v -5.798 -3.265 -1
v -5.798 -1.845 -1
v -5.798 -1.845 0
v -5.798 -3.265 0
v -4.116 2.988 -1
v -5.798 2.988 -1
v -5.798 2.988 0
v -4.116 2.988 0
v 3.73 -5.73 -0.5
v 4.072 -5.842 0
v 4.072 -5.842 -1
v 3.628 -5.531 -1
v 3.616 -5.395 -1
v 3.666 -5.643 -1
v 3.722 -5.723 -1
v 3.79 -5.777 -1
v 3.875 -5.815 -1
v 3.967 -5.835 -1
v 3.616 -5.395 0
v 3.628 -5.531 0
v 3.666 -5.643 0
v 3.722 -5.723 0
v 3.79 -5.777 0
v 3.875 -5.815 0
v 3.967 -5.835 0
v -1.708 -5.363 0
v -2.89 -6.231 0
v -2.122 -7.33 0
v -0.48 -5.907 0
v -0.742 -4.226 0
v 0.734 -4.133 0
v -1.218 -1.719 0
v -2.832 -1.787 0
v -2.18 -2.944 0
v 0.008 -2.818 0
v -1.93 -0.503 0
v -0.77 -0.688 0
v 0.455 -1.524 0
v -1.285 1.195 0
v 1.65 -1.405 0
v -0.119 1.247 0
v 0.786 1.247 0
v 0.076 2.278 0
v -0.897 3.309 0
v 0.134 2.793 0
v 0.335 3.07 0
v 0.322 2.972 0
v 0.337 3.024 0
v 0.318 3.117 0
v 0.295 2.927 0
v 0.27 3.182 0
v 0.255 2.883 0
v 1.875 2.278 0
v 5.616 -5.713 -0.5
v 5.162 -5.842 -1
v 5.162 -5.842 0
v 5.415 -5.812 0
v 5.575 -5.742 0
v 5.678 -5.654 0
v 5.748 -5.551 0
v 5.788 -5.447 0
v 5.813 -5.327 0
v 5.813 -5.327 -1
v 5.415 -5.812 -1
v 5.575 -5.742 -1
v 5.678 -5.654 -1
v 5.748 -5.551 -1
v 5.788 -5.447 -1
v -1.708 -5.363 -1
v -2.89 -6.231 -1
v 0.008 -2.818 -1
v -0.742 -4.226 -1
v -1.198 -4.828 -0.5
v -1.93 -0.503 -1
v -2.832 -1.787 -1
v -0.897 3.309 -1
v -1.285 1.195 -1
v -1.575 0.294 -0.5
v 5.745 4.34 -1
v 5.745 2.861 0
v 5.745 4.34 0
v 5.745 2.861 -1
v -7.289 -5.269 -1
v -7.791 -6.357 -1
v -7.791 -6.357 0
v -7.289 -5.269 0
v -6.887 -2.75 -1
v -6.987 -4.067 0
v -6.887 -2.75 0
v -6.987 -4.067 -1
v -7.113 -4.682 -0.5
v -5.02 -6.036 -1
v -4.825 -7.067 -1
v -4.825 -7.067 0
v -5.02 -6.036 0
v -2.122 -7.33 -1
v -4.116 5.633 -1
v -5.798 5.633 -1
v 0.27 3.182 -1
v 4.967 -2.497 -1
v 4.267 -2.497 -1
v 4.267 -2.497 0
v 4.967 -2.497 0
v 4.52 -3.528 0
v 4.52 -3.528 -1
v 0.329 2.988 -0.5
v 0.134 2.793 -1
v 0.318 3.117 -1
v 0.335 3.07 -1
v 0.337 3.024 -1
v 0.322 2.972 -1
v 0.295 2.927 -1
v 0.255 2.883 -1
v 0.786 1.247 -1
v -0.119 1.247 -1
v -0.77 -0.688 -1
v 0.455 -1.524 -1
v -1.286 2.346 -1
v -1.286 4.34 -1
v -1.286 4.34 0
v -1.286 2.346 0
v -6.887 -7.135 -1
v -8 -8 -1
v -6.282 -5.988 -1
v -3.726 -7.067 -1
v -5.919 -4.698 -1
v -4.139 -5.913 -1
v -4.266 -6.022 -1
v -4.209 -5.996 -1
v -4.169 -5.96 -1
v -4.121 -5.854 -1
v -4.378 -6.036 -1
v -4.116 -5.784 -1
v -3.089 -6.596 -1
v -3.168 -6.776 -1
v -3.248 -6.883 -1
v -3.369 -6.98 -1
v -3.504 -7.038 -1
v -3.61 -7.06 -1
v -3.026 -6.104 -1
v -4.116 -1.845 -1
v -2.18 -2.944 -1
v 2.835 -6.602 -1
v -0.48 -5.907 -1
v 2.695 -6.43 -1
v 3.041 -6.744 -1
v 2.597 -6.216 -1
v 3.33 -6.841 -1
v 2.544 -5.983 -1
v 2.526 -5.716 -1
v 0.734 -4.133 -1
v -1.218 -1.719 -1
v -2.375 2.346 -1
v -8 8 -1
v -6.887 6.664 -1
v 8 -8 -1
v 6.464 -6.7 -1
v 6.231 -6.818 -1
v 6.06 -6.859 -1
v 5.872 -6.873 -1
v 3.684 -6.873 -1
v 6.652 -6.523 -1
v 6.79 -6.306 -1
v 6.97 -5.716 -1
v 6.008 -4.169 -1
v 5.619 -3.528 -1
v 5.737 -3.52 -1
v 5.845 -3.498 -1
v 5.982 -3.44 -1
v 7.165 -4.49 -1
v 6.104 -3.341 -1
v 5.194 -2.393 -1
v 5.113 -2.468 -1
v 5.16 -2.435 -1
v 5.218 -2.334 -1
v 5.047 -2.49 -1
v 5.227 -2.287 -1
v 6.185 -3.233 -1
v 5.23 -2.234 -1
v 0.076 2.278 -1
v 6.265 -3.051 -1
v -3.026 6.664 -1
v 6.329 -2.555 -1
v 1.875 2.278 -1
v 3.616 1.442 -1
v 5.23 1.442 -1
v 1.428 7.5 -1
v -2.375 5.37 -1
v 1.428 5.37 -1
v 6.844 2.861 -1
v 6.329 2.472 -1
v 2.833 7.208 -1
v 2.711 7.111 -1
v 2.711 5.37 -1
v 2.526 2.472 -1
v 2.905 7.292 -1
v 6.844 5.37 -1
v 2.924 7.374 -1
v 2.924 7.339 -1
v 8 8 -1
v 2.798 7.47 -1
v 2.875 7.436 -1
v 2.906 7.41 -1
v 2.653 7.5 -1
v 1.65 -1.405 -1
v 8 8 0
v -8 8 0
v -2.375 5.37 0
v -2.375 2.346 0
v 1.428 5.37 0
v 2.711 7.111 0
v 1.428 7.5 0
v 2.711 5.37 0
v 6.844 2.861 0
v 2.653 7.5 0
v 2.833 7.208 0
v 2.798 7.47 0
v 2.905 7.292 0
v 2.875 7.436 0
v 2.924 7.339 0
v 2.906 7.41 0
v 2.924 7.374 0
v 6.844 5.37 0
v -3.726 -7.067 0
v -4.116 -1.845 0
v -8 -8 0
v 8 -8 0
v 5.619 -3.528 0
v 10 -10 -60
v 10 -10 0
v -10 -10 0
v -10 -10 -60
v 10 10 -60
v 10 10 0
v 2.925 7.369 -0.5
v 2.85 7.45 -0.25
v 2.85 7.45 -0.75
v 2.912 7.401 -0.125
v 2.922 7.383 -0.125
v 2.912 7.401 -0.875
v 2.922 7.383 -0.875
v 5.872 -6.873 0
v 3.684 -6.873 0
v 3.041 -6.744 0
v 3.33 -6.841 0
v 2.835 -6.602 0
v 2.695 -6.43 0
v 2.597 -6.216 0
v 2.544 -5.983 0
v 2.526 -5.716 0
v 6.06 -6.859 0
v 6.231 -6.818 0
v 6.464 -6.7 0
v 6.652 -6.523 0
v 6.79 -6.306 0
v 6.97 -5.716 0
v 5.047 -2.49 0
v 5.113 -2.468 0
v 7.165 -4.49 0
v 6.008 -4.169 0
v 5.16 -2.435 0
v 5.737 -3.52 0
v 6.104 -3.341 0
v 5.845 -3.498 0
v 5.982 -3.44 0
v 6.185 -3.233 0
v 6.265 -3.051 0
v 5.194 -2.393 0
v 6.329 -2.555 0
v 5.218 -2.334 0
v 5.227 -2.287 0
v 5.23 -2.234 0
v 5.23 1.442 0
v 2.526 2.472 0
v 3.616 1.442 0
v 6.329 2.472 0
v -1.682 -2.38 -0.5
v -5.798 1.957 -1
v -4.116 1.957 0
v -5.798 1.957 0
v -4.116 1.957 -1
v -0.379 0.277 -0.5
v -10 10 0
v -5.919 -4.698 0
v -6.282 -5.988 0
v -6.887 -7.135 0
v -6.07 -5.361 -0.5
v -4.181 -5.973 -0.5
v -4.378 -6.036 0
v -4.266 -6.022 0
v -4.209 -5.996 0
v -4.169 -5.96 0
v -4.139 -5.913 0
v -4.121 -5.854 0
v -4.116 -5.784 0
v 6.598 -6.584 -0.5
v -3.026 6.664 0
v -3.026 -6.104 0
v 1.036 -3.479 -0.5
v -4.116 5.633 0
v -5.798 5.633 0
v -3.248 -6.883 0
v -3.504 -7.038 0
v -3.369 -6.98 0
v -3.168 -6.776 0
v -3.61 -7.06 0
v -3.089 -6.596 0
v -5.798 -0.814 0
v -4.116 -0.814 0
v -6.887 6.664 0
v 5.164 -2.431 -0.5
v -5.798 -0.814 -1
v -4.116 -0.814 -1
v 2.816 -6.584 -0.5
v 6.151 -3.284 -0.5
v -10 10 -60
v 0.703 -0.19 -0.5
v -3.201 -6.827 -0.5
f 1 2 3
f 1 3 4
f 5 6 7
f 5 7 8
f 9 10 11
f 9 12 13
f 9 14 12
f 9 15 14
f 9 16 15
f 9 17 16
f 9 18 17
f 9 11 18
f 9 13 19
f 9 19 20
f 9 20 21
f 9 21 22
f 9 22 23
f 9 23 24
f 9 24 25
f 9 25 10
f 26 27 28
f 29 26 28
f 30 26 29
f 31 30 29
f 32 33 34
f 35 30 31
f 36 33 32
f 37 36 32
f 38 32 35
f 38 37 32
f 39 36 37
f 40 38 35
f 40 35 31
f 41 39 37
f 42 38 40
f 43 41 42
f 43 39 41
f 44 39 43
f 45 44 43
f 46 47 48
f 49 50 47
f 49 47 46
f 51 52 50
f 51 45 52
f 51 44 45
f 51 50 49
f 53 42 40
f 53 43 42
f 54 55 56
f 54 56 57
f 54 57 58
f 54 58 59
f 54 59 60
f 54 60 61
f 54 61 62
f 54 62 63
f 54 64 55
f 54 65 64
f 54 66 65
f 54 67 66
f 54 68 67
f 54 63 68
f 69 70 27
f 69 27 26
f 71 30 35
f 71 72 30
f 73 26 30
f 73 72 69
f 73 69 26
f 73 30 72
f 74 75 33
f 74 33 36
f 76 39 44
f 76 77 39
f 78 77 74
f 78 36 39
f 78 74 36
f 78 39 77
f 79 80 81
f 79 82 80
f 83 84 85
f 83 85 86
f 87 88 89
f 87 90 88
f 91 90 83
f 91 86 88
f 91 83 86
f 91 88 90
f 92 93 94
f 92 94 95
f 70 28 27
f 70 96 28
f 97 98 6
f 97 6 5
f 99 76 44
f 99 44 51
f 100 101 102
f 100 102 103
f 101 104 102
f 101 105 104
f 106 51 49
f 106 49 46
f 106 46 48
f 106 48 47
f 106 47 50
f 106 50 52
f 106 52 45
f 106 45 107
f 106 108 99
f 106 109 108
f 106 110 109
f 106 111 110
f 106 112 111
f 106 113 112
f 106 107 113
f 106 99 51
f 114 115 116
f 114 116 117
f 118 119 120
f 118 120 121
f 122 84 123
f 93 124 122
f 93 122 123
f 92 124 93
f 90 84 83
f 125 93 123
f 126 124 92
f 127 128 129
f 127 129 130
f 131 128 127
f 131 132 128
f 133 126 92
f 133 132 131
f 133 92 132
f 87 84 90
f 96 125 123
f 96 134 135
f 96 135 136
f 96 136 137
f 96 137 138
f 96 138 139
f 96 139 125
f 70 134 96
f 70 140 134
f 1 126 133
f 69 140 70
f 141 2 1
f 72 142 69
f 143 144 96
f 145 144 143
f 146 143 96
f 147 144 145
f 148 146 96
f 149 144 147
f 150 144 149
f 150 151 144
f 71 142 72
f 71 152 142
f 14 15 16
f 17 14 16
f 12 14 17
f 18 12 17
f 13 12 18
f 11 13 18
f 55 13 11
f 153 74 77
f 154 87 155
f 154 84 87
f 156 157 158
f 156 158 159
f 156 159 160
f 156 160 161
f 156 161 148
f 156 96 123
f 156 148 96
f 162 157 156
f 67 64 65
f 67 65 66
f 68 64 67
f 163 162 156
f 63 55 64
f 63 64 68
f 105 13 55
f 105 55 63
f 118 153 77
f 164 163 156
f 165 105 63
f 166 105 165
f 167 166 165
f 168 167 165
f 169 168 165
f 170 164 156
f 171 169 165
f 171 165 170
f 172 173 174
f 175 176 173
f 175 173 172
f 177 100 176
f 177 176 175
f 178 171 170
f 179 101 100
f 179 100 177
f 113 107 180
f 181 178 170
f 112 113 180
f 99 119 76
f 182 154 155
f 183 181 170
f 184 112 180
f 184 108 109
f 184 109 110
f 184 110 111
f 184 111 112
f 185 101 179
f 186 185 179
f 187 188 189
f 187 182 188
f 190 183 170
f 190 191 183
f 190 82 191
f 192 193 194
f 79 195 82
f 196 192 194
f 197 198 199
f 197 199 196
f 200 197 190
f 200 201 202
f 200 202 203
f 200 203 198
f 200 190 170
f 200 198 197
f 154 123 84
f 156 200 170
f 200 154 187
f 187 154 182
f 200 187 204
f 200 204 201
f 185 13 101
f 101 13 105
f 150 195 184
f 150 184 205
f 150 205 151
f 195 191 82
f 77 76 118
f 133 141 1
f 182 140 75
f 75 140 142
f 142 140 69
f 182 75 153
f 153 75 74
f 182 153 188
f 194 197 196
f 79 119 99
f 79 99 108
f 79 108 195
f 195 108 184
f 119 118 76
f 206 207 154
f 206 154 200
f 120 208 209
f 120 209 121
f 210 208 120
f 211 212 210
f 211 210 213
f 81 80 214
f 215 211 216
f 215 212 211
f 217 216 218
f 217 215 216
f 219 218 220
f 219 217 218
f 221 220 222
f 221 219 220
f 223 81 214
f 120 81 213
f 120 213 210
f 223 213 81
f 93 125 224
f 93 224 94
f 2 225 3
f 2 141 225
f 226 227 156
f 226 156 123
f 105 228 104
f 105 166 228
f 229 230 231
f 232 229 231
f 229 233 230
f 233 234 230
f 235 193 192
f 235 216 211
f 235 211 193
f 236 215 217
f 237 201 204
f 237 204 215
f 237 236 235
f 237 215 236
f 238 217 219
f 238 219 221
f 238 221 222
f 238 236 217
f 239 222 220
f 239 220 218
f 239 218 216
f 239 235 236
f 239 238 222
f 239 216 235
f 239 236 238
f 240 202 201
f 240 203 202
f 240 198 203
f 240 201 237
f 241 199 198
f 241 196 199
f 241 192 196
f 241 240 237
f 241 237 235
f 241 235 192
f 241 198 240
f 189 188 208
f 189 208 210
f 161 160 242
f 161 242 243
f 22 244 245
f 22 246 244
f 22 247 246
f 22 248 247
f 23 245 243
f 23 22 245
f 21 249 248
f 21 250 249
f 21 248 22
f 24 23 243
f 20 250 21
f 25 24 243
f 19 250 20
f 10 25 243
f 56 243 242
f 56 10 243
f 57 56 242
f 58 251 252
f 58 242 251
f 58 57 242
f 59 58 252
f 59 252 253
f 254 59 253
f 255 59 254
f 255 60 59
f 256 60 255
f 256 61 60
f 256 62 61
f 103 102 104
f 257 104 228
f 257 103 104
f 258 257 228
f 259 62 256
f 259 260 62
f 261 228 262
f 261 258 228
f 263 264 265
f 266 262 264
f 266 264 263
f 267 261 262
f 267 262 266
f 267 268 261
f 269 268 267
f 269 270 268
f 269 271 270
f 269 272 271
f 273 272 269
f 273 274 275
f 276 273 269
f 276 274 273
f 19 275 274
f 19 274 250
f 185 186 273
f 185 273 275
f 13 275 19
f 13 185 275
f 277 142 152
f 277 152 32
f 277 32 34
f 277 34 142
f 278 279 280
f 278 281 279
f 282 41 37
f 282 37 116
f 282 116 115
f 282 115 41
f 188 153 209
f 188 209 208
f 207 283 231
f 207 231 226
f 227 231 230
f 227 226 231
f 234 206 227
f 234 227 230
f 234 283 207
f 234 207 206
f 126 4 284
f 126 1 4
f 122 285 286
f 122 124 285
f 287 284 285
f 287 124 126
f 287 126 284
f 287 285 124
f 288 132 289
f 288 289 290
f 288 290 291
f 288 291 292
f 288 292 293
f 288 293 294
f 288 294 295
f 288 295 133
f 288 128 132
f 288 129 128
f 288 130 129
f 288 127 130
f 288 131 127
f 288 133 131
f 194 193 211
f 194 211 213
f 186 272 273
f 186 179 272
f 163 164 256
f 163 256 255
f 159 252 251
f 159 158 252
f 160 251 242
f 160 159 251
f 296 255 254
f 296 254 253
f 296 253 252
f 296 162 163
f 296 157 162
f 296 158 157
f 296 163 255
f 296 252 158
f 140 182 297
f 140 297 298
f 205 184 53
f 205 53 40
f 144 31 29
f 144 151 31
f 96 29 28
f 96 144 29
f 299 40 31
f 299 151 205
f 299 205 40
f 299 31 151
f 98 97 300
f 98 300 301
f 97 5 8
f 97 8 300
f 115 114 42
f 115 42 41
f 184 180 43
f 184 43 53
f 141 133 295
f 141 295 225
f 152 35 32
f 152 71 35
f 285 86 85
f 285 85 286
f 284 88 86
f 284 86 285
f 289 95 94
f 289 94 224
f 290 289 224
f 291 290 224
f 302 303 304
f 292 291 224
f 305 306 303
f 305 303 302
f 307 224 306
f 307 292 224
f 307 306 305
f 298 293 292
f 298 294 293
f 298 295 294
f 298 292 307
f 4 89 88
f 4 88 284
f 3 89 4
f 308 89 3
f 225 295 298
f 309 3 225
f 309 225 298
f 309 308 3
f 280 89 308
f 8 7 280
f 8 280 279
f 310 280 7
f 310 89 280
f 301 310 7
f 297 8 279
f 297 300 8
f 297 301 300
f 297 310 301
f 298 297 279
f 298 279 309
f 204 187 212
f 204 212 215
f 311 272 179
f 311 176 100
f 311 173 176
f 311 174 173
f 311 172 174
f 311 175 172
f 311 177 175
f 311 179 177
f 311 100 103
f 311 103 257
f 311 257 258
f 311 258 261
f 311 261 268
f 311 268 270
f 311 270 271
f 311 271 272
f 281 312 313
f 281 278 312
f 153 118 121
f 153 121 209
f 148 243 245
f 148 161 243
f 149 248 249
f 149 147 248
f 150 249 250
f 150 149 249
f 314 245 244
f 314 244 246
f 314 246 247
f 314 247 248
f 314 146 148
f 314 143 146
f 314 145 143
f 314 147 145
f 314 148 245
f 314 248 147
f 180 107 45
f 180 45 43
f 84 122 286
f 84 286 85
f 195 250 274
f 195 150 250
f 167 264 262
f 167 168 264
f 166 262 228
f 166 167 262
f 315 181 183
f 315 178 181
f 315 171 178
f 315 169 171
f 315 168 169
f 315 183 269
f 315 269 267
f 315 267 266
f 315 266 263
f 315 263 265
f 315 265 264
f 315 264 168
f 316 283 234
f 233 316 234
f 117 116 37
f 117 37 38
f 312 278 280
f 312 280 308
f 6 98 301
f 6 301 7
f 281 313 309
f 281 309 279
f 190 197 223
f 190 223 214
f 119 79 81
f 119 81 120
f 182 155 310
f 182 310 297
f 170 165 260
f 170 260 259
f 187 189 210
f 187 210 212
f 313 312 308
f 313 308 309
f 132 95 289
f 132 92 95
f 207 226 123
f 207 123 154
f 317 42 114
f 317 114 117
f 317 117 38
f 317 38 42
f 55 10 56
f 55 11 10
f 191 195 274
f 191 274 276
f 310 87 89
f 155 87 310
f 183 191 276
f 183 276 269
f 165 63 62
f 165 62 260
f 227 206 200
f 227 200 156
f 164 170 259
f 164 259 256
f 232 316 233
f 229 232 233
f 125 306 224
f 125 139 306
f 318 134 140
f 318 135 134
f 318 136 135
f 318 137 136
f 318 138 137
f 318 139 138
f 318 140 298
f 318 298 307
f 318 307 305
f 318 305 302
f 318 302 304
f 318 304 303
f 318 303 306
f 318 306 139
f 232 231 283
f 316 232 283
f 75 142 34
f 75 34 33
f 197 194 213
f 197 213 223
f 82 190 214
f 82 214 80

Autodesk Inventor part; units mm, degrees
ref_plane "YZ Plane" through (0, 0, 0) normal (1, 0, 0) x (0, 1, 0)
ref_plane "XZ Plane" through (0, 0, 0) normal (0, 1, 0) x (-1, 0, 0)
ref_plane "XY Plane" through (0, 0, 0) normal (0, 0, 1) x (1, 0, 0)
sketch "スケッチ1" plane through (0, 0, 0) normal (0, 0, 1) x (1, 0, 0)
  line L0 (-10, 10) -> (10, 10)
  line L1 (10, 10) -> (10, -10)
  line L2 (10, -10) -> (-10, -10)
  line L3 (-10, -10) -> (-10, 10)
  line L4 (-10, 10) -> (10, -10) construction
  line L5 (10, 10) -> (-10, -10) construction
  point P0 (0, 0)
  dimension "d0" = 20
  dimension "d1" = 20
extrude "押し出し1" add sketch "スケッチ1" against normal blind 60
sketch "スケッチ2" plane through (0, 0, 0) normal (0, 0, 1) x (1, 0, 0)
  line L0 (-8, 8) -> (8, 8)
  line L1 (8, 8) -> (8, -8)
  line L2 (8, -8) -> (-8, -8)
  line L3 (-8, -8) -> (-8, 8)
  line L4 (-8, 8) -> (8, -8) construction
  line L5 (8, 8) -> (-8, -8) construction
  point P0 (0, 0)
  dimension "d4" = 16
  dimension "d5" = 16
extrude "押し出し2" cut sketch "スケッチ2" against normal blind 1
sketch "スケッチ3" plane through (0, 0, -1) normal (0, 0, 1) x (1, 0, 0)
  line L0 (-7.5, 7.5) -> (7, 7.5) construction
  line L1 (7, 7.5) -> (7, -7.5) construction
  line L2 (7, -7.5) -> (-7.5, -7.5) construction
  line L3 (-7.5, -7.5) -> (-7.5, 7.5) construction
  line L4 (-8, 8) -> (8, 8) projected
  line L5 (8, -8) -> (-8, -8) projected
  line L6 (-8, -8) -> (-8, 8) projected
  line L7 (8, 8) -> (8, -8) projected
  spline S0 degree 2 poles (-4.378, -6.0365) (-4.1155, -6.0365) (-4.1155, -5.7836) knots 0 0 0 1 1 1
  line L8 (-4.1155, -5.7836) -> (-4.1155, -1.8452)
  line L9 (-4.1155, -1.8452) -> (-5.7978, -1.8452)
  line L10 (-5.7978, -1.8452) -> (-5.7978, -3.265)
  spline S1 degree 2 poles (-5.7978, -3.265) (-5.7978, -5.5211) (-6.887, -7.1353) knots 0 0 0 1 1 1
  line L11 (-6.887, -7.1353) -> (-7.7913, -6.3574)
  spline S2 degree 2 poles (-7.7913, -6.3574) (-6.887, -4.8112) (-6.887, -2.7496) knots 0 0 0 1 1 1
  line L12 (-6.887, -2.7496) -> (-6.887, 6.6637)
  line L13 (-6.887, 6.6637) -> (-3.0263, 6.6637)
  line L14 (-3.0263, 6.6637) -> (-3.0263, -6.1045)
  spline S3 degree 2 poles (-3.0263, -6.1045) (-3.0263, -7.0673) (-3.7265, -7.0673) knots 0 0 0 1 1 1
  line L15 (-3.7265, -7.0673) -> (-4.8254, -7.0673)
  line L16 (-4.8254, -7.0673) -> (-5.0199, -6.0365)
  line L17 (-5.0199, -6.0365) -> (-4.378, -6.0365)
  line L18 (0.0758, 2.278) -> (1.8748, 2.278)
  spline S4 degree 2 poles (1.8748, 2.278) (2.1957, -4.4319) (-2.122, -7.3298) knots 0 0 0 1 1 1
  line L19 (-2.122, -7.3298) -> (-2.8902, -6.231)
  spline S5 degree 2 poles (-2.8902, -6.231) (-0.955, -5.1321) (0.0077, -2.8177) knots 0 0 0 1 1 1
  line L20 (0.0077, -2.8177) -> (-1.2176, -1.7188)
  spline S6 degree 2 poles (-1.2176, -1.7188) (-1.6649, -2.4287) (-2.1803, -2.9441) knots 0 0 0 1 1 1
  line L21 (-2.1803, -2.9441) -> (-2.8318, -1.7869)
  spline S7 degree 2 poles (-2.8318, -1.7869) (-1.2857, -0.1726) (-0.8967, 3.3088) knots 0 0 0 1 1 1
  line L22 (-0.8967, 3.3088) -> (0.2703, 3.1823)
  spline S8 degree 2 poles (0.2703, 3.1823) (0.455, 2.9878) (0.1341, 2.7934) knots 0 0 0 1 1 1
  line L23 (0.1341, 2.7934) -> (0.0758, 2.278)
  spline S9 degree 2 poles (6.3286, -2.5551) (6.3286, -3.5276) (5.6187, -3.5276) knots 0 0 0 1 1 1
  line L24 (5.6187, -3.5276) -> (4.5199, -3.5276)
  line L25 (4.5199, -3.5276) -> (4.267, -2.4968)
  line L26 (4.267, -2.4968) -> (4.9672, -2.4968)
  spline S10 degree 2 poles (4.9672, -2.4968) (5.2297, -2.4968) (5.2297, -2.2342) knots 0 0 0 1 1 1
  line L27 (5.2297, -2.2342) -> (5.2297, 1.4417)
  line L28 (5.2297, 1.4417) -> (3.6155, 1.4417)
  line L29 (3.6155, 1.4417) -> (3.6155, -5.3947)
  spline S11 degree 2 poles (3.6155, -5.3947) (3.6155, -5.842) (4.0725, -5.842) knots 0 0 0 1 1 1
  line L30 (4.0725, -5.842) -> (5.1617, -5.842)
  spline S12 degree 2 poles (5.1617, -5.842) (5.7451, -5.842) (5.8132, -5.3266) knots 0 0 0 1 1 1
  line L31 (5.8132, -5.3266) -> (6.0077, -4.1694)
  line L32 (6.0077, -4.1694) -> (7.1649, -4.4903)
  line L33 (7.1649, -4.4903) -> (6.9704, -5.7156)
  spline S13 degree 2 poles (6.9704, -5.7156) (6.7759, -6.8728) (5.8716, -6.8728) knots 0 0 0 1 1 1
  line L34 (5.8716, -6.8728) -> (3.6835, -6.8728)
  spline S14 degree 2 poles (3.6835, -6.8728) (2.5263, -6.8728) (2.5263, -5.7156) knots 0 0 0 1 1 1
  line L35 (2.5263, -5.7156) -> (2.5263, 2.4724)
  line L36 (2.5263, 2.4724) -> (6.3286, 2.4724)
  line L37 (6.3286, 2.4724) -> (6.3286, -2.5551)
  line L38 (-2.3748, 2.346) -> (-2.3748, 5.3703)
  line L39 (-2.3748, 5.3703) -> (1.4275, 5.3703)
  line L40 (1.4275, 5.3703) -> (1.4275, 7.5)
  line L41 (1.4275, 7.5) -> (2.6528, 7.5)
  spline S15 degree 2 poles (2.6528, 7.5) (3.1682, 7.4319) (2.7111, 7.111) knots 0 0 0 1 1 1
  line L42 (2.7111, 7.111) -> (2.7111, 5.3703)
  line L43 (2.7111, 5.3703) -> (6.844, 5.3703)
  line L44 (6.844, 5.3703) -> (6.844, 2.8614)
  line L45 (6.844, 2.8614) -> (5.7451, 2.8614)
  line L46 (5.7451, 2.8614) -> (5.7451, 4.3395)
  line L47 (5.7451, 4.3395) -> (-1.2857, 4.3395)
  line L48 (-1.2857, 4.3395) -> (-1.2857, 2.346)
  line L49 (-1.2857, 2.346) -> (-2.3748, 2.346)
  line L50 (-4.1155, -0.8144) -> (-4.1155, 1.957)
  line L51 (-4.1155, 1.957) -> (-5.7978, 1.957)
  line L52 (-5.7978, 1.957) -> (-5.7978, -0.8144)
  line L53 (-5.7978, -0.8144) -> (-4.1155, -0.8144)
  line L54 (-5.7978, 2.9878) -> (-4.1155, 2.9878)
  line L55 (-4.1155, 2.9878) -> (-4.1155, 5.6329)
  line L56 (-4.1155, 5.6329) -> (-5.7978, 5.6329)
  line L57 (-5.7978, 5.6329) -> (-5.7978, 2.9878)
  spline S16 degree 2 poles (-0.1187, 1.2472) (-0.3132, 0.2747) (-0.7703, -0.688) knots 0 0 0 1 1 1
  line L58 (-0.7703, -0.688) -> (0.455, -1.5243)
  spline S17 degree 2 poles (0.455, -1.5243) (0.7857, -0.2407) (0.7857, 1.2472) knots 0 0 0 1 1 1
  line L59 (0.7857, 1.2472) -> (-0.1187, 1.2472)
  point P0 (0, 0)
  dimension "d8" = 0.5
  dimension "d9" = 0.5
  dimension "d10" = 0.5
  dimension "d11" = 1
extrude "押し出し3" add sketch "スケッチ3" along normal blind 1 contours S0 L8 L9 L10 S1 L11 S2 L12 L13 L14 S3 L15 L16 L17 | L18 S4 L19 S5 L20 S6 L21 S7 L22 S8 L23 | S9 L24 L25 L26 S10 L27 L28 L29 S11 L30 S12 L31 L32 L33 S13 L34 S14 L35 L36 L37 | L38 L39 L40 L41 S15 L42 L43 L44 L45 L46 L47 L48 L49
properties part number "ハンコ"
